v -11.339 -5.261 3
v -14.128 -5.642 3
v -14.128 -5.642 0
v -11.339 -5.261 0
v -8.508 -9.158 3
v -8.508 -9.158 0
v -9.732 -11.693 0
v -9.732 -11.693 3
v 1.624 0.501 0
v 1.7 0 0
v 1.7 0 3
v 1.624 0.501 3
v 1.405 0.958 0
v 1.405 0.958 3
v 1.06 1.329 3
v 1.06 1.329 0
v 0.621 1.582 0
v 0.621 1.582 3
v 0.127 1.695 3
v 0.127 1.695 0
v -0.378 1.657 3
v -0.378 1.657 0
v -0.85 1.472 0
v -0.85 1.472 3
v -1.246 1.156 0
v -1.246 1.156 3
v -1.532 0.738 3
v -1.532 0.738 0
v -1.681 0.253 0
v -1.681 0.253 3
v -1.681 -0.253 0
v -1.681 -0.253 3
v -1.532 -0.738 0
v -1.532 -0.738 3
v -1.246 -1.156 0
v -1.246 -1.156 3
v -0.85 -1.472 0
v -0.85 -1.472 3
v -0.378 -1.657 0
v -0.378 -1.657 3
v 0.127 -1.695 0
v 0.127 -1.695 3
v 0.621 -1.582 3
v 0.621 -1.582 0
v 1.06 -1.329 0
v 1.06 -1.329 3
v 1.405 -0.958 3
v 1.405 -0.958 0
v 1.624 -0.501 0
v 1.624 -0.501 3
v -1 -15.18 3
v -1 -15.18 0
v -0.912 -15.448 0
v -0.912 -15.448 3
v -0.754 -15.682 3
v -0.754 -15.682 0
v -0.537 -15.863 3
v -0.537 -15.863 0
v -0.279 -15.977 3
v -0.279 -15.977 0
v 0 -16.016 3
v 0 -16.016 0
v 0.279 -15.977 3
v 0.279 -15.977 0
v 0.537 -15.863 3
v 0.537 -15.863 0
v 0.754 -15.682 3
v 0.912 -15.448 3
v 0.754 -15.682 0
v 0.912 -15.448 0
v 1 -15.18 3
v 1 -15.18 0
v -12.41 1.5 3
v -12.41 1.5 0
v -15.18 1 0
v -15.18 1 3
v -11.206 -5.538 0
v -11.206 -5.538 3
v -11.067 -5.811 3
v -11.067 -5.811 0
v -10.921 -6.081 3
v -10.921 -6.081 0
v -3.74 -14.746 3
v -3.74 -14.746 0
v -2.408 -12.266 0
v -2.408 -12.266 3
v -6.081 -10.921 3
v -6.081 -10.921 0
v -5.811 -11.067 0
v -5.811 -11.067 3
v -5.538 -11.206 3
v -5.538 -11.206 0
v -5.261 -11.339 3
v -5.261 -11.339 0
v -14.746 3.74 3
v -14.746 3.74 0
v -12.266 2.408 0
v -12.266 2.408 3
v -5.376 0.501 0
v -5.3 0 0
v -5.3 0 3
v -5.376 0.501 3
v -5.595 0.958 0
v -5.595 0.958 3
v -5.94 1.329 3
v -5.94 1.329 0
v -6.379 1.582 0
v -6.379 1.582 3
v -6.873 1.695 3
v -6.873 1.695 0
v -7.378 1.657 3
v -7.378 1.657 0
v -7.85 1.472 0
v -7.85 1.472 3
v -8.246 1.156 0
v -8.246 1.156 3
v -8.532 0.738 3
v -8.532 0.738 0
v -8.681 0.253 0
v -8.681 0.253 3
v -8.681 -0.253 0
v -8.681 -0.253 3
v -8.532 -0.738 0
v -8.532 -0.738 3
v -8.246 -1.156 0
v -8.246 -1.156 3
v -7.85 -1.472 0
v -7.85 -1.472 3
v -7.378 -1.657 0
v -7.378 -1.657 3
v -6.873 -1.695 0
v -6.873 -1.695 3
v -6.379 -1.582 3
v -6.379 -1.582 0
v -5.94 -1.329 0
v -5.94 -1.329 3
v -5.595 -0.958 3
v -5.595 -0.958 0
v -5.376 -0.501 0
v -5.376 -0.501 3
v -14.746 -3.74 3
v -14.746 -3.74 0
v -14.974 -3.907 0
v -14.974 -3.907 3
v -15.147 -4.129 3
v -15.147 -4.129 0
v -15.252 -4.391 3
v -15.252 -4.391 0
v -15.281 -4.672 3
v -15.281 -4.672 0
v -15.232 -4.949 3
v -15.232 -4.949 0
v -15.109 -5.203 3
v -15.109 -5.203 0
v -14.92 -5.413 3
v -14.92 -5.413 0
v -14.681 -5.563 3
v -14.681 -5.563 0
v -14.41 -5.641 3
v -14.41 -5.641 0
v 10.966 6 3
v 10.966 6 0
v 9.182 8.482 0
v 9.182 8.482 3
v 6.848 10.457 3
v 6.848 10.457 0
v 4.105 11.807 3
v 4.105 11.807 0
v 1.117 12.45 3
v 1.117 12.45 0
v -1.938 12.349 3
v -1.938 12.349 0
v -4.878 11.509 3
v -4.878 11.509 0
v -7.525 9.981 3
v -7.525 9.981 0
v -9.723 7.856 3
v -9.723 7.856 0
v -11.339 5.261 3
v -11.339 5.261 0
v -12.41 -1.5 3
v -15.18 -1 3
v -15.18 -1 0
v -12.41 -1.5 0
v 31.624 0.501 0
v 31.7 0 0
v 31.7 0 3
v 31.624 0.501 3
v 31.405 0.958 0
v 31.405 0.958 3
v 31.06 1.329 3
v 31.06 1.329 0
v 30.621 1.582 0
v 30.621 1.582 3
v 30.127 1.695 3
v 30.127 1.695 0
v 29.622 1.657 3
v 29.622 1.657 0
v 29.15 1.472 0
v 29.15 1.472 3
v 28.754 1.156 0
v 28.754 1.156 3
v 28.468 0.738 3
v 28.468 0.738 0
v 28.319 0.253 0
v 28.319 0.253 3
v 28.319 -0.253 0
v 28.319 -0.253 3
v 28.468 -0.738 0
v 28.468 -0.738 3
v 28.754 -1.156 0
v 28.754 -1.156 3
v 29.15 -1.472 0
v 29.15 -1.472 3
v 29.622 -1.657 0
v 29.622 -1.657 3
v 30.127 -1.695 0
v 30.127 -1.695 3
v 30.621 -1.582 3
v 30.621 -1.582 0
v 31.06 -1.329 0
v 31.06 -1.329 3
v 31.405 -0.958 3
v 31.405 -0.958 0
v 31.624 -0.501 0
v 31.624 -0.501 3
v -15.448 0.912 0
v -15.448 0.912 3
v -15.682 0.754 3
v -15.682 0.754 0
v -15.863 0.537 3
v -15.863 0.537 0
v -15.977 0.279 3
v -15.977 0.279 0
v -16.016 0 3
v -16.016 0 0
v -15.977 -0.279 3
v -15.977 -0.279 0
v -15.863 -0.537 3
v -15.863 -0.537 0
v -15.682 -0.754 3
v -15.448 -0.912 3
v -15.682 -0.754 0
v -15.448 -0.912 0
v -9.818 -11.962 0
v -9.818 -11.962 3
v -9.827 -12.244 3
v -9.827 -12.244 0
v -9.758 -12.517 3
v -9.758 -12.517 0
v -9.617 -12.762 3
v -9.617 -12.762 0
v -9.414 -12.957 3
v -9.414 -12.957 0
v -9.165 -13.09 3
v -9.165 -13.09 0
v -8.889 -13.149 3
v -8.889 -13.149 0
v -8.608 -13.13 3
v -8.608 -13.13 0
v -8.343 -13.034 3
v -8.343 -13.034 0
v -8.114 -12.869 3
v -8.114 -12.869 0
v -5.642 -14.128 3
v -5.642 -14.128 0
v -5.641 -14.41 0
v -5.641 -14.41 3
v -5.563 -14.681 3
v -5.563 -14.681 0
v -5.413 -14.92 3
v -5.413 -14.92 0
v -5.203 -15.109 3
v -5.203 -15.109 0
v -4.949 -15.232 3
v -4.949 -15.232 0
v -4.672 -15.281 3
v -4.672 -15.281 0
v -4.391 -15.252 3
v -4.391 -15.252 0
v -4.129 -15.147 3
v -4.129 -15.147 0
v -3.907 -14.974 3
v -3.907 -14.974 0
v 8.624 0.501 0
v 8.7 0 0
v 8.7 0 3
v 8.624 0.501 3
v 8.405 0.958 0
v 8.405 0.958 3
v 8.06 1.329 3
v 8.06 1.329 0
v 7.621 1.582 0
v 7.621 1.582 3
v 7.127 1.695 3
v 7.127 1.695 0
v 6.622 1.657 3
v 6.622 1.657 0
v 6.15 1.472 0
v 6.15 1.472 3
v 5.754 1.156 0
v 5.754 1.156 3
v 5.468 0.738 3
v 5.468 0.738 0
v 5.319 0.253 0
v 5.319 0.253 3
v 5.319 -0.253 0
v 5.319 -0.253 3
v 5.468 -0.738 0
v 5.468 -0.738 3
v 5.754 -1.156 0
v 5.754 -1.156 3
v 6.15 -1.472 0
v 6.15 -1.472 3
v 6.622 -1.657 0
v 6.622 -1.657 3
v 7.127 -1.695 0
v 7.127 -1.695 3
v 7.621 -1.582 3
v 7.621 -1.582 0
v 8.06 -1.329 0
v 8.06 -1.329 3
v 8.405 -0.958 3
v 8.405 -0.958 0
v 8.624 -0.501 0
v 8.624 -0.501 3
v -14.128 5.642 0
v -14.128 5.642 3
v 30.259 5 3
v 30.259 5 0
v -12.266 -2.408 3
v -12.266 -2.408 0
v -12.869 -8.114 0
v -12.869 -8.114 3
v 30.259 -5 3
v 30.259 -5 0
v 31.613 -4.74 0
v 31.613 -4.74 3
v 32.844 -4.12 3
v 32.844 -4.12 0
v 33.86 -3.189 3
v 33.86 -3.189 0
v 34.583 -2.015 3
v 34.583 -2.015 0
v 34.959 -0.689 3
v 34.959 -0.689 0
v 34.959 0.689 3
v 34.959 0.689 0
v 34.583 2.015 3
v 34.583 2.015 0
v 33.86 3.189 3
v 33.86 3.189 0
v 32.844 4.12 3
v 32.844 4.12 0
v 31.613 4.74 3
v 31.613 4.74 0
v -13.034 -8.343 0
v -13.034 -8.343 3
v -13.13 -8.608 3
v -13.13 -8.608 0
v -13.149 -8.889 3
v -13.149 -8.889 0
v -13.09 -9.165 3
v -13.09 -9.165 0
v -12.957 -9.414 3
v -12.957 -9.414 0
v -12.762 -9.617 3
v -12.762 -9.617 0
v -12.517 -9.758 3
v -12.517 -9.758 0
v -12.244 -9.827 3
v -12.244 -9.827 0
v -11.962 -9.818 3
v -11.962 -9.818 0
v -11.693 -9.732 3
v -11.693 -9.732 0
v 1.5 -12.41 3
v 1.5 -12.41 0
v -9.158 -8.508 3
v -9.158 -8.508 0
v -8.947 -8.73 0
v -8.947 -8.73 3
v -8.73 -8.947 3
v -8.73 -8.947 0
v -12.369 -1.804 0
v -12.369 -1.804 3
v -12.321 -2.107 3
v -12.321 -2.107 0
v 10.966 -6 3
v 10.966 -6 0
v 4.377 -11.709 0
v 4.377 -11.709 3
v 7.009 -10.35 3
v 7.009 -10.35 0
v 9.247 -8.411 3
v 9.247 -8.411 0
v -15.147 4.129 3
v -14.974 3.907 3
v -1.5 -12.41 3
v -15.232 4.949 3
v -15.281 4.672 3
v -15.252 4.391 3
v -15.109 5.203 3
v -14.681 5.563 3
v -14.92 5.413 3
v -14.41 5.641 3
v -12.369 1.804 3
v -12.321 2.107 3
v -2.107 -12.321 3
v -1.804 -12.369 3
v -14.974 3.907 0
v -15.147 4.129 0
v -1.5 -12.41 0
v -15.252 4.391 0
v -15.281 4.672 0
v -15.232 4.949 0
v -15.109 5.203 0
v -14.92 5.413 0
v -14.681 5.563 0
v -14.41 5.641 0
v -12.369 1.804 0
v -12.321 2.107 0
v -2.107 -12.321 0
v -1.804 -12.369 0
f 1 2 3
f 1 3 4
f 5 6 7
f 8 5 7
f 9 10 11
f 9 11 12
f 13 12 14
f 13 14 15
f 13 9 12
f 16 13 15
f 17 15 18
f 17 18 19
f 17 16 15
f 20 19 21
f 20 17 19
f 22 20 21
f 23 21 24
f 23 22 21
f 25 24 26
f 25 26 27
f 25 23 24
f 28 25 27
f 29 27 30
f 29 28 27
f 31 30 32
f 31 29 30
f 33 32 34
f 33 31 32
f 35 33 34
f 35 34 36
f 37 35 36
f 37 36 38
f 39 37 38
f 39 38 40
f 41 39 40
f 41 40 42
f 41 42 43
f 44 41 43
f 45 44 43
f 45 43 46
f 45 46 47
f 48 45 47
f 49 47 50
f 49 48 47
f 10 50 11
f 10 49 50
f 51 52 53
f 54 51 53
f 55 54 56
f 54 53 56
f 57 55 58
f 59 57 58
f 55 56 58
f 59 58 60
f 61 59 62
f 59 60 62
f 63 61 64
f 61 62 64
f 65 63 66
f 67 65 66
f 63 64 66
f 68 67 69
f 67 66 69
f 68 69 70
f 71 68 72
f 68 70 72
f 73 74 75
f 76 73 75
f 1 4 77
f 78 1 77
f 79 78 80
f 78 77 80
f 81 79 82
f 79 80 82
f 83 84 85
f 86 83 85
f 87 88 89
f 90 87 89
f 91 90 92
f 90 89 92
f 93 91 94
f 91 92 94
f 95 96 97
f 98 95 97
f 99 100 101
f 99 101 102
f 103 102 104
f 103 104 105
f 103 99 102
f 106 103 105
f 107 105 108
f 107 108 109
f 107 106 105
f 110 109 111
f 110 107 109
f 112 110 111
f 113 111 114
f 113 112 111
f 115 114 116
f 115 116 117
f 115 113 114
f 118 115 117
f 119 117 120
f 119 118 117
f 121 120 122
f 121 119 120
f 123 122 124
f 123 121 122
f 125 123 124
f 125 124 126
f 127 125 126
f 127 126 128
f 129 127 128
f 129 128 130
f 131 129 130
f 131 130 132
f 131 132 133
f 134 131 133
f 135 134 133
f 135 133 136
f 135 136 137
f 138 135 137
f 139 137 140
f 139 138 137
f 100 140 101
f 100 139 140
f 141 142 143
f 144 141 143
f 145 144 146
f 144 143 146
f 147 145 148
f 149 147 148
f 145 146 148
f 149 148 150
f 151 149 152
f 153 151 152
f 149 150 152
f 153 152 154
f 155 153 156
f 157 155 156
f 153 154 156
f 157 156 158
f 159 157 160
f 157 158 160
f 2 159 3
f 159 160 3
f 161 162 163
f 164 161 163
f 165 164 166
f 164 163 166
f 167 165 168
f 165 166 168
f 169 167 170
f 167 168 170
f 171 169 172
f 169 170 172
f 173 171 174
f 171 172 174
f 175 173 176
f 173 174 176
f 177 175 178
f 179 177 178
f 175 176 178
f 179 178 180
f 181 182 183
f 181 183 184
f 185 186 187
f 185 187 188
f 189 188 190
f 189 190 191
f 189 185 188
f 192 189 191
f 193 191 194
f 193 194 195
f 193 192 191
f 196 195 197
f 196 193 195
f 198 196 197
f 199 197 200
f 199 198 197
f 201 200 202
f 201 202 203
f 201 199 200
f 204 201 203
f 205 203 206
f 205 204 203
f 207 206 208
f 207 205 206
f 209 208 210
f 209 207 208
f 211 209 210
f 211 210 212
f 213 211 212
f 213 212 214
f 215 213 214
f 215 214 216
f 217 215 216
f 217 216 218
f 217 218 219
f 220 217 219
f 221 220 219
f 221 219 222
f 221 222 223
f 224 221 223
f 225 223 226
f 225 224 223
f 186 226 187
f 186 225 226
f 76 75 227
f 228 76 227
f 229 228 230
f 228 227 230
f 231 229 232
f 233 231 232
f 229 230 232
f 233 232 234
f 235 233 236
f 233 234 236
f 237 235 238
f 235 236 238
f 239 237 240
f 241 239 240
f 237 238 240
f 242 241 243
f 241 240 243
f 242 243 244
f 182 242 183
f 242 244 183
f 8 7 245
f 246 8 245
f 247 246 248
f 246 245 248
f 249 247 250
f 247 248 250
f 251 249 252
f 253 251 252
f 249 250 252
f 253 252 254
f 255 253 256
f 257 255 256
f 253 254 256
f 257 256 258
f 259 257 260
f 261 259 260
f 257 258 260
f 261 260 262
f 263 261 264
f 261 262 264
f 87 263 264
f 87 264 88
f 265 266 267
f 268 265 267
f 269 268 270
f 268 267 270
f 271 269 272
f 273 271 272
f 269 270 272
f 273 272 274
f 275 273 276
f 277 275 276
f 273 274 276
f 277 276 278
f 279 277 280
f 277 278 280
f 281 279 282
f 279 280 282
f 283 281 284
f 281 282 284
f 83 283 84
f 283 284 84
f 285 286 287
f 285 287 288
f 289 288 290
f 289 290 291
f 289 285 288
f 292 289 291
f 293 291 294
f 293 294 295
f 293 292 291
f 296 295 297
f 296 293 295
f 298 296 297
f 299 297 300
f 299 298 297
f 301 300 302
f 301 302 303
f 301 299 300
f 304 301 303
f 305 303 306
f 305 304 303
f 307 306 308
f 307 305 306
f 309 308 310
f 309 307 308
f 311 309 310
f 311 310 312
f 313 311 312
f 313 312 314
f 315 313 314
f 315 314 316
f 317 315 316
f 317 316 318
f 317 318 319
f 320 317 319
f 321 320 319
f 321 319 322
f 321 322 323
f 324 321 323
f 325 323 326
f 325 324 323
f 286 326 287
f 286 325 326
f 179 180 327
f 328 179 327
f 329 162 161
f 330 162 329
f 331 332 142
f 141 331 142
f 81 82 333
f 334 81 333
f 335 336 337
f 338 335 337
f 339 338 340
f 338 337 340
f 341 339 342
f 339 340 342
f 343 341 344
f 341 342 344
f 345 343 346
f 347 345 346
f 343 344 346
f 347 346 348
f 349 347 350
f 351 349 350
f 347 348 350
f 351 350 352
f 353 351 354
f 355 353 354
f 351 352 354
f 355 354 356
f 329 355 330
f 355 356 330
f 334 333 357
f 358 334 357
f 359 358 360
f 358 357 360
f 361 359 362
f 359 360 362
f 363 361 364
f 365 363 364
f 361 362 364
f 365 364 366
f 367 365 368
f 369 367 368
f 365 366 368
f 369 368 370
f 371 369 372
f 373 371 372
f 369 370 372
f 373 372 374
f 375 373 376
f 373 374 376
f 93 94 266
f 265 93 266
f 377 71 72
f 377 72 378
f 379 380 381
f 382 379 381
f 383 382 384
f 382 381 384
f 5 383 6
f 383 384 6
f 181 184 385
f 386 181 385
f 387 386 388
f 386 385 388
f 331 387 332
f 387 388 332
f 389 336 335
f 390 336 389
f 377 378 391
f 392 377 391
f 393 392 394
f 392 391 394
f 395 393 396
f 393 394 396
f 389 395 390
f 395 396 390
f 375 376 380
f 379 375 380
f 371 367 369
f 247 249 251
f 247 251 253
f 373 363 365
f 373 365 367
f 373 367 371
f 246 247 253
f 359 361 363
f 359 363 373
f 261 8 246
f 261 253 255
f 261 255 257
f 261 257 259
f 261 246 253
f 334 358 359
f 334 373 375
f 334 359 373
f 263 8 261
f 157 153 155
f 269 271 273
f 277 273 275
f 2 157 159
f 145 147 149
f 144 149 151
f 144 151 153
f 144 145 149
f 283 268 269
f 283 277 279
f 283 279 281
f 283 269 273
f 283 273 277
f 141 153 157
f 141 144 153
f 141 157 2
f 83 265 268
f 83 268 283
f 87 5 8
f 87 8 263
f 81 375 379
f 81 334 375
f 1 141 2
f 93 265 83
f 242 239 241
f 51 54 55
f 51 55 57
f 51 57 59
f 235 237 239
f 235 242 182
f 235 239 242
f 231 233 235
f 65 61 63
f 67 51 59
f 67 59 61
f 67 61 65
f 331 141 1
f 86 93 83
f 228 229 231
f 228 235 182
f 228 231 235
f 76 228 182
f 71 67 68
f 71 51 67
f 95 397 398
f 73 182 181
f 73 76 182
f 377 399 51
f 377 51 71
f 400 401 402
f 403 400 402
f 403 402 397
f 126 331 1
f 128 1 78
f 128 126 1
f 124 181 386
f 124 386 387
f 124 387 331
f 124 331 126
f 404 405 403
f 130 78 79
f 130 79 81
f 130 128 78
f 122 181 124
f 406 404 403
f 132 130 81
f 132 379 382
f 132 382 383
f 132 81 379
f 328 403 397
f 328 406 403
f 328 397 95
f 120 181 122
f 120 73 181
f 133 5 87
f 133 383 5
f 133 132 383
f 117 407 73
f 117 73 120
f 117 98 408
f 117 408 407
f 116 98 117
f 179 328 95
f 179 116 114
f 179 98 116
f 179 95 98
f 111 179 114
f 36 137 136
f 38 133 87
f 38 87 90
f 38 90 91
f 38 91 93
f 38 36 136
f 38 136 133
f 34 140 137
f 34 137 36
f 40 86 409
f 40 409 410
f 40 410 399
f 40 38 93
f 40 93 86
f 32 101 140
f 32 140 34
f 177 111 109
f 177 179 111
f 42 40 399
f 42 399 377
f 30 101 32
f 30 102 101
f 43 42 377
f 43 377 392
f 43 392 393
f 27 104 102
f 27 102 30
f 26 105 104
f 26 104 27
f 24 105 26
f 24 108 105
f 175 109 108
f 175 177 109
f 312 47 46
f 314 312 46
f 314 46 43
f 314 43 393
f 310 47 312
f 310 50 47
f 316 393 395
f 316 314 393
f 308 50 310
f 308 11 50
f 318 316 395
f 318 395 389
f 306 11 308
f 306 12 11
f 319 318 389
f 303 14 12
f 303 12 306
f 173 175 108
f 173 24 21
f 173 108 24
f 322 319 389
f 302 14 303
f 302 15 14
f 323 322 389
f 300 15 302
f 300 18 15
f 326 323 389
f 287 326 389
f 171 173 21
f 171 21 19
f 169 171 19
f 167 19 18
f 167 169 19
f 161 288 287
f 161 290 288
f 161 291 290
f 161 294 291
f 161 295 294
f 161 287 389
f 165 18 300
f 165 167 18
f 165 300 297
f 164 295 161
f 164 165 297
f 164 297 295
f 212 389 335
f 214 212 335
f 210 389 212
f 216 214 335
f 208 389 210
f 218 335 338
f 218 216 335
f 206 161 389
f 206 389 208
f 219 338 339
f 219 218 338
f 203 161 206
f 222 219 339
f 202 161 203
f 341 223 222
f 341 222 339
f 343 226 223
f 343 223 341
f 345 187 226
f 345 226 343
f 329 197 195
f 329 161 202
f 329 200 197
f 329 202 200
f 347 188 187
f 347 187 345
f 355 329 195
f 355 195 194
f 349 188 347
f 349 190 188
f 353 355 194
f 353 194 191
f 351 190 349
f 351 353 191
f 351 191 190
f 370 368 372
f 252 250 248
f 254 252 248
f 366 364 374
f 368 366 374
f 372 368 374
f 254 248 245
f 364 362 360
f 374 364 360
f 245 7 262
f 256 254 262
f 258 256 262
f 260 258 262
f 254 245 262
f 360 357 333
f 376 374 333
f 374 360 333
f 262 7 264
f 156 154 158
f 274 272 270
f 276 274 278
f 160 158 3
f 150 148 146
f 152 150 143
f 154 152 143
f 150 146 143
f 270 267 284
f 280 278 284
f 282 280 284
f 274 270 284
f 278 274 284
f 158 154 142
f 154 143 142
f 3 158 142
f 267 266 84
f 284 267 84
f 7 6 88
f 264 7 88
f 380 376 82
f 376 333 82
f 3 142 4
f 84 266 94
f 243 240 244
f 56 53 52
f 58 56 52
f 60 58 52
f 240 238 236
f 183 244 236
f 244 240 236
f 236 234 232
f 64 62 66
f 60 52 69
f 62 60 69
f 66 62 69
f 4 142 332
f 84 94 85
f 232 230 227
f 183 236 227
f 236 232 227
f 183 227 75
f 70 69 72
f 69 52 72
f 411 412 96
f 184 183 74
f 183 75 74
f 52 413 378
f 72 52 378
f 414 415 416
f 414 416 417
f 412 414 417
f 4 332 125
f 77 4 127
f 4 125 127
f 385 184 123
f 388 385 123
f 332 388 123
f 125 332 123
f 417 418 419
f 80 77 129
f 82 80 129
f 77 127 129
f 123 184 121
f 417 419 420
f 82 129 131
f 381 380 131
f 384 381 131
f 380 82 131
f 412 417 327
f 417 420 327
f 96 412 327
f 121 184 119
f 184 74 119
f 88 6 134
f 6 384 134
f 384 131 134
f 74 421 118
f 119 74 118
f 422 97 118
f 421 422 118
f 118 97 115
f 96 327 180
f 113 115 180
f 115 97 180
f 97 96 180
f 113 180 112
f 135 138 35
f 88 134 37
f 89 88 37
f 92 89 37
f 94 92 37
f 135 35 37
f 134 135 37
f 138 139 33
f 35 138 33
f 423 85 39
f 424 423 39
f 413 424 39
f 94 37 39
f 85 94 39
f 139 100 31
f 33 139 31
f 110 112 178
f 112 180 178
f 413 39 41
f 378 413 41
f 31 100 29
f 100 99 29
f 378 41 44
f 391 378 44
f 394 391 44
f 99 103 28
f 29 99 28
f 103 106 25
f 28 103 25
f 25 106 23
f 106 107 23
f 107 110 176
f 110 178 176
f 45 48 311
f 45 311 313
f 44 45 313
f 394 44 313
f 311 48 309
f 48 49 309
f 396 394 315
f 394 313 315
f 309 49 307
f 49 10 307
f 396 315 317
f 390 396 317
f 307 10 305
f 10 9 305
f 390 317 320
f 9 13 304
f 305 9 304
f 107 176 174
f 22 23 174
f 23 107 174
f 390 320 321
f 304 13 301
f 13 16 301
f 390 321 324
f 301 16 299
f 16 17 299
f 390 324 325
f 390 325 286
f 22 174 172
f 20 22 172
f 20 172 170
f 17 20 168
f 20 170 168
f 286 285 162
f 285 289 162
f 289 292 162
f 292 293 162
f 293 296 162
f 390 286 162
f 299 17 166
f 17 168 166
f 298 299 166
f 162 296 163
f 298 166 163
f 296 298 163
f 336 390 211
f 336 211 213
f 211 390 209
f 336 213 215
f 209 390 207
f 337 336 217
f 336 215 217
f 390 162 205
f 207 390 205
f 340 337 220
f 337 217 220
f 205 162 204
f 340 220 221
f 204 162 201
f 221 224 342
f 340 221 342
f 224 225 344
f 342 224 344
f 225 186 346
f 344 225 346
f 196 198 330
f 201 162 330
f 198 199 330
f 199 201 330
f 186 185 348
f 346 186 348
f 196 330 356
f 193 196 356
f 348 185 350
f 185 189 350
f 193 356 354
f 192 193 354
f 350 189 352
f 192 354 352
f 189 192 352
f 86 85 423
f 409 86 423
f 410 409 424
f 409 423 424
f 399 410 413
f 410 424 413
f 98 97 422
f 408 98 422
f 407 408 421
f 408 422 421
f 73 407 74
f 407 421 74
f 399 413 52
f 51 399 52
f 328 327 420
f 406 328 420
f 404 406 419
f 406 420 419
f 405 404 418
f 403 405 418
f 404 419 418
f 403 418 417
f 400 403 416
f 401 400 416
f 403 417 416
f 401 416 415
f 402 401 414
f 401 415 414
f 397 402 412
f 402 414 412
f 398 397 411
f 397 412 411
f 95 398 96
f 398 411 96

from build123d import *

# Parameters (mm, degrees)
SKETCH_R  = 1.7
PAD_DEPTH = 3


with BuildPart() as part:
    # Sketch → Pad (new body)
    with BuildSketch(Plane.XY):
        with BuildLine():
            ThreePointArc((-11.338775, -5.261385), (-11.137582, -5.674881), (-10.921315, -6.080698))
            Line((-10.921315, -6.080698), (-12.869031, -8.11383))
            ThreePointArc((-12.869031, -8.11383), (-12.957339, -9.414058), (-11.69346, -9.731864))
            Line((-11.69346, -9.731864), (-9.157959, -8.507749))
            ThreePointArc((-9.157959, -8.507749), (-8.838835, -8.838835), (-8.507749, -9.157959))
            Line((-8.507749, -9.157959), (-9.731864, -11.69346))
            ThreePointArc((-9.731864, -11.69346), (-9.414058, -12.957339), (-8.11383, -12.869031))
            Line((-8.11383, -12.869031), (-6.080698, -10.921315))
            ThreePointArc((-6.080698, -10.921315), (-5.674881, -11.137582), (-5.261385, -11.338775))
            Line((-5.261385, -11.338775), (-5.642075, -14.128453))
            ThreePointArc((-5.642075, -14.128453), (-4.949263, -15.232265), (-3.739962, -14.746487))
            Line((-3.739962, -14.746487), (-2.408215, -12.265826))
            ThreePointArc((-2.408215, -12.265826), (-1.955431, -12.346104), (-1.5, -12.409674))
            Line((-1.5, -12.409674), (-1, -15.180455))
            ThreePointArc((-1, -15.180455), (0, -16.016151), (1, -15.180455))
            Line((1, -15.180455), (1.5, -12.409674))
            ThreePointArc((1.5, -12.409674), (7.008593, -10.350344), (10.965856, -6))
            Line((30.259157, -5), (10.965856, -6))
            ThreePointArc((30.259157, -5), (35.006712, 0), (30.259157, 5))
            Line((10.965856, 6), (30.259157, 5))
            ThreePointArc((10.965856, 6), (-0.413709, 12.493152), (-11.338775, 5.261385))
            Line((-11.338775, 5.261385), (-14.128453, 5.642075))
            ThreePointArc((-14.128453, 5.642075), (-15.232265, 4.949263), (-14.746487, 3.739962))
            Line((-14.746487, 3.739962), (-12.265826, 2.408215))
            ThreePointArc((-12.265826, 2.408215), (-12.346104, 1.955431), (-12.409674, 1.5))
            Line((-12.409674, 1.5), (-15.180455, 1))
            ThreePointArc((-15.180455, 1), (-16.016151, 0), (-15.180455, -1))
            Line((-15.180455, -1), (-12.409674, -1.5))
            ThreePointArc((-12.409674, -1.5), (-12.346104, -1.955431), (-12.265826, -2.408215))
            Line((-12.265826, -2.408215), (-14.746487, -3.739962))
            ThreePointArc((-14.746487, -3.739962), (-15.232265, -4.949263), (-14.128453, -5.642075))
            Line((-14.128453, -5.642075), (-11.338775, -5.261385))
        make_face()
        Circle(SKETCH_R, mode=Mode.SUBTRACT)
        with Locations((7, 0)):
            Circle(SKETCH_R, mode=Mode.SUBTRACT)
        with Locations((-7, 0)):
            Circle(SKETCH_R, mode=Mode.SUBTRACT)
        with Locations((30, 0)):
            Circle(SKETCH_R, mode=Mode.SUBTRACT)
    extrude(amount=PAD_DEPTH)


solid = part.part
